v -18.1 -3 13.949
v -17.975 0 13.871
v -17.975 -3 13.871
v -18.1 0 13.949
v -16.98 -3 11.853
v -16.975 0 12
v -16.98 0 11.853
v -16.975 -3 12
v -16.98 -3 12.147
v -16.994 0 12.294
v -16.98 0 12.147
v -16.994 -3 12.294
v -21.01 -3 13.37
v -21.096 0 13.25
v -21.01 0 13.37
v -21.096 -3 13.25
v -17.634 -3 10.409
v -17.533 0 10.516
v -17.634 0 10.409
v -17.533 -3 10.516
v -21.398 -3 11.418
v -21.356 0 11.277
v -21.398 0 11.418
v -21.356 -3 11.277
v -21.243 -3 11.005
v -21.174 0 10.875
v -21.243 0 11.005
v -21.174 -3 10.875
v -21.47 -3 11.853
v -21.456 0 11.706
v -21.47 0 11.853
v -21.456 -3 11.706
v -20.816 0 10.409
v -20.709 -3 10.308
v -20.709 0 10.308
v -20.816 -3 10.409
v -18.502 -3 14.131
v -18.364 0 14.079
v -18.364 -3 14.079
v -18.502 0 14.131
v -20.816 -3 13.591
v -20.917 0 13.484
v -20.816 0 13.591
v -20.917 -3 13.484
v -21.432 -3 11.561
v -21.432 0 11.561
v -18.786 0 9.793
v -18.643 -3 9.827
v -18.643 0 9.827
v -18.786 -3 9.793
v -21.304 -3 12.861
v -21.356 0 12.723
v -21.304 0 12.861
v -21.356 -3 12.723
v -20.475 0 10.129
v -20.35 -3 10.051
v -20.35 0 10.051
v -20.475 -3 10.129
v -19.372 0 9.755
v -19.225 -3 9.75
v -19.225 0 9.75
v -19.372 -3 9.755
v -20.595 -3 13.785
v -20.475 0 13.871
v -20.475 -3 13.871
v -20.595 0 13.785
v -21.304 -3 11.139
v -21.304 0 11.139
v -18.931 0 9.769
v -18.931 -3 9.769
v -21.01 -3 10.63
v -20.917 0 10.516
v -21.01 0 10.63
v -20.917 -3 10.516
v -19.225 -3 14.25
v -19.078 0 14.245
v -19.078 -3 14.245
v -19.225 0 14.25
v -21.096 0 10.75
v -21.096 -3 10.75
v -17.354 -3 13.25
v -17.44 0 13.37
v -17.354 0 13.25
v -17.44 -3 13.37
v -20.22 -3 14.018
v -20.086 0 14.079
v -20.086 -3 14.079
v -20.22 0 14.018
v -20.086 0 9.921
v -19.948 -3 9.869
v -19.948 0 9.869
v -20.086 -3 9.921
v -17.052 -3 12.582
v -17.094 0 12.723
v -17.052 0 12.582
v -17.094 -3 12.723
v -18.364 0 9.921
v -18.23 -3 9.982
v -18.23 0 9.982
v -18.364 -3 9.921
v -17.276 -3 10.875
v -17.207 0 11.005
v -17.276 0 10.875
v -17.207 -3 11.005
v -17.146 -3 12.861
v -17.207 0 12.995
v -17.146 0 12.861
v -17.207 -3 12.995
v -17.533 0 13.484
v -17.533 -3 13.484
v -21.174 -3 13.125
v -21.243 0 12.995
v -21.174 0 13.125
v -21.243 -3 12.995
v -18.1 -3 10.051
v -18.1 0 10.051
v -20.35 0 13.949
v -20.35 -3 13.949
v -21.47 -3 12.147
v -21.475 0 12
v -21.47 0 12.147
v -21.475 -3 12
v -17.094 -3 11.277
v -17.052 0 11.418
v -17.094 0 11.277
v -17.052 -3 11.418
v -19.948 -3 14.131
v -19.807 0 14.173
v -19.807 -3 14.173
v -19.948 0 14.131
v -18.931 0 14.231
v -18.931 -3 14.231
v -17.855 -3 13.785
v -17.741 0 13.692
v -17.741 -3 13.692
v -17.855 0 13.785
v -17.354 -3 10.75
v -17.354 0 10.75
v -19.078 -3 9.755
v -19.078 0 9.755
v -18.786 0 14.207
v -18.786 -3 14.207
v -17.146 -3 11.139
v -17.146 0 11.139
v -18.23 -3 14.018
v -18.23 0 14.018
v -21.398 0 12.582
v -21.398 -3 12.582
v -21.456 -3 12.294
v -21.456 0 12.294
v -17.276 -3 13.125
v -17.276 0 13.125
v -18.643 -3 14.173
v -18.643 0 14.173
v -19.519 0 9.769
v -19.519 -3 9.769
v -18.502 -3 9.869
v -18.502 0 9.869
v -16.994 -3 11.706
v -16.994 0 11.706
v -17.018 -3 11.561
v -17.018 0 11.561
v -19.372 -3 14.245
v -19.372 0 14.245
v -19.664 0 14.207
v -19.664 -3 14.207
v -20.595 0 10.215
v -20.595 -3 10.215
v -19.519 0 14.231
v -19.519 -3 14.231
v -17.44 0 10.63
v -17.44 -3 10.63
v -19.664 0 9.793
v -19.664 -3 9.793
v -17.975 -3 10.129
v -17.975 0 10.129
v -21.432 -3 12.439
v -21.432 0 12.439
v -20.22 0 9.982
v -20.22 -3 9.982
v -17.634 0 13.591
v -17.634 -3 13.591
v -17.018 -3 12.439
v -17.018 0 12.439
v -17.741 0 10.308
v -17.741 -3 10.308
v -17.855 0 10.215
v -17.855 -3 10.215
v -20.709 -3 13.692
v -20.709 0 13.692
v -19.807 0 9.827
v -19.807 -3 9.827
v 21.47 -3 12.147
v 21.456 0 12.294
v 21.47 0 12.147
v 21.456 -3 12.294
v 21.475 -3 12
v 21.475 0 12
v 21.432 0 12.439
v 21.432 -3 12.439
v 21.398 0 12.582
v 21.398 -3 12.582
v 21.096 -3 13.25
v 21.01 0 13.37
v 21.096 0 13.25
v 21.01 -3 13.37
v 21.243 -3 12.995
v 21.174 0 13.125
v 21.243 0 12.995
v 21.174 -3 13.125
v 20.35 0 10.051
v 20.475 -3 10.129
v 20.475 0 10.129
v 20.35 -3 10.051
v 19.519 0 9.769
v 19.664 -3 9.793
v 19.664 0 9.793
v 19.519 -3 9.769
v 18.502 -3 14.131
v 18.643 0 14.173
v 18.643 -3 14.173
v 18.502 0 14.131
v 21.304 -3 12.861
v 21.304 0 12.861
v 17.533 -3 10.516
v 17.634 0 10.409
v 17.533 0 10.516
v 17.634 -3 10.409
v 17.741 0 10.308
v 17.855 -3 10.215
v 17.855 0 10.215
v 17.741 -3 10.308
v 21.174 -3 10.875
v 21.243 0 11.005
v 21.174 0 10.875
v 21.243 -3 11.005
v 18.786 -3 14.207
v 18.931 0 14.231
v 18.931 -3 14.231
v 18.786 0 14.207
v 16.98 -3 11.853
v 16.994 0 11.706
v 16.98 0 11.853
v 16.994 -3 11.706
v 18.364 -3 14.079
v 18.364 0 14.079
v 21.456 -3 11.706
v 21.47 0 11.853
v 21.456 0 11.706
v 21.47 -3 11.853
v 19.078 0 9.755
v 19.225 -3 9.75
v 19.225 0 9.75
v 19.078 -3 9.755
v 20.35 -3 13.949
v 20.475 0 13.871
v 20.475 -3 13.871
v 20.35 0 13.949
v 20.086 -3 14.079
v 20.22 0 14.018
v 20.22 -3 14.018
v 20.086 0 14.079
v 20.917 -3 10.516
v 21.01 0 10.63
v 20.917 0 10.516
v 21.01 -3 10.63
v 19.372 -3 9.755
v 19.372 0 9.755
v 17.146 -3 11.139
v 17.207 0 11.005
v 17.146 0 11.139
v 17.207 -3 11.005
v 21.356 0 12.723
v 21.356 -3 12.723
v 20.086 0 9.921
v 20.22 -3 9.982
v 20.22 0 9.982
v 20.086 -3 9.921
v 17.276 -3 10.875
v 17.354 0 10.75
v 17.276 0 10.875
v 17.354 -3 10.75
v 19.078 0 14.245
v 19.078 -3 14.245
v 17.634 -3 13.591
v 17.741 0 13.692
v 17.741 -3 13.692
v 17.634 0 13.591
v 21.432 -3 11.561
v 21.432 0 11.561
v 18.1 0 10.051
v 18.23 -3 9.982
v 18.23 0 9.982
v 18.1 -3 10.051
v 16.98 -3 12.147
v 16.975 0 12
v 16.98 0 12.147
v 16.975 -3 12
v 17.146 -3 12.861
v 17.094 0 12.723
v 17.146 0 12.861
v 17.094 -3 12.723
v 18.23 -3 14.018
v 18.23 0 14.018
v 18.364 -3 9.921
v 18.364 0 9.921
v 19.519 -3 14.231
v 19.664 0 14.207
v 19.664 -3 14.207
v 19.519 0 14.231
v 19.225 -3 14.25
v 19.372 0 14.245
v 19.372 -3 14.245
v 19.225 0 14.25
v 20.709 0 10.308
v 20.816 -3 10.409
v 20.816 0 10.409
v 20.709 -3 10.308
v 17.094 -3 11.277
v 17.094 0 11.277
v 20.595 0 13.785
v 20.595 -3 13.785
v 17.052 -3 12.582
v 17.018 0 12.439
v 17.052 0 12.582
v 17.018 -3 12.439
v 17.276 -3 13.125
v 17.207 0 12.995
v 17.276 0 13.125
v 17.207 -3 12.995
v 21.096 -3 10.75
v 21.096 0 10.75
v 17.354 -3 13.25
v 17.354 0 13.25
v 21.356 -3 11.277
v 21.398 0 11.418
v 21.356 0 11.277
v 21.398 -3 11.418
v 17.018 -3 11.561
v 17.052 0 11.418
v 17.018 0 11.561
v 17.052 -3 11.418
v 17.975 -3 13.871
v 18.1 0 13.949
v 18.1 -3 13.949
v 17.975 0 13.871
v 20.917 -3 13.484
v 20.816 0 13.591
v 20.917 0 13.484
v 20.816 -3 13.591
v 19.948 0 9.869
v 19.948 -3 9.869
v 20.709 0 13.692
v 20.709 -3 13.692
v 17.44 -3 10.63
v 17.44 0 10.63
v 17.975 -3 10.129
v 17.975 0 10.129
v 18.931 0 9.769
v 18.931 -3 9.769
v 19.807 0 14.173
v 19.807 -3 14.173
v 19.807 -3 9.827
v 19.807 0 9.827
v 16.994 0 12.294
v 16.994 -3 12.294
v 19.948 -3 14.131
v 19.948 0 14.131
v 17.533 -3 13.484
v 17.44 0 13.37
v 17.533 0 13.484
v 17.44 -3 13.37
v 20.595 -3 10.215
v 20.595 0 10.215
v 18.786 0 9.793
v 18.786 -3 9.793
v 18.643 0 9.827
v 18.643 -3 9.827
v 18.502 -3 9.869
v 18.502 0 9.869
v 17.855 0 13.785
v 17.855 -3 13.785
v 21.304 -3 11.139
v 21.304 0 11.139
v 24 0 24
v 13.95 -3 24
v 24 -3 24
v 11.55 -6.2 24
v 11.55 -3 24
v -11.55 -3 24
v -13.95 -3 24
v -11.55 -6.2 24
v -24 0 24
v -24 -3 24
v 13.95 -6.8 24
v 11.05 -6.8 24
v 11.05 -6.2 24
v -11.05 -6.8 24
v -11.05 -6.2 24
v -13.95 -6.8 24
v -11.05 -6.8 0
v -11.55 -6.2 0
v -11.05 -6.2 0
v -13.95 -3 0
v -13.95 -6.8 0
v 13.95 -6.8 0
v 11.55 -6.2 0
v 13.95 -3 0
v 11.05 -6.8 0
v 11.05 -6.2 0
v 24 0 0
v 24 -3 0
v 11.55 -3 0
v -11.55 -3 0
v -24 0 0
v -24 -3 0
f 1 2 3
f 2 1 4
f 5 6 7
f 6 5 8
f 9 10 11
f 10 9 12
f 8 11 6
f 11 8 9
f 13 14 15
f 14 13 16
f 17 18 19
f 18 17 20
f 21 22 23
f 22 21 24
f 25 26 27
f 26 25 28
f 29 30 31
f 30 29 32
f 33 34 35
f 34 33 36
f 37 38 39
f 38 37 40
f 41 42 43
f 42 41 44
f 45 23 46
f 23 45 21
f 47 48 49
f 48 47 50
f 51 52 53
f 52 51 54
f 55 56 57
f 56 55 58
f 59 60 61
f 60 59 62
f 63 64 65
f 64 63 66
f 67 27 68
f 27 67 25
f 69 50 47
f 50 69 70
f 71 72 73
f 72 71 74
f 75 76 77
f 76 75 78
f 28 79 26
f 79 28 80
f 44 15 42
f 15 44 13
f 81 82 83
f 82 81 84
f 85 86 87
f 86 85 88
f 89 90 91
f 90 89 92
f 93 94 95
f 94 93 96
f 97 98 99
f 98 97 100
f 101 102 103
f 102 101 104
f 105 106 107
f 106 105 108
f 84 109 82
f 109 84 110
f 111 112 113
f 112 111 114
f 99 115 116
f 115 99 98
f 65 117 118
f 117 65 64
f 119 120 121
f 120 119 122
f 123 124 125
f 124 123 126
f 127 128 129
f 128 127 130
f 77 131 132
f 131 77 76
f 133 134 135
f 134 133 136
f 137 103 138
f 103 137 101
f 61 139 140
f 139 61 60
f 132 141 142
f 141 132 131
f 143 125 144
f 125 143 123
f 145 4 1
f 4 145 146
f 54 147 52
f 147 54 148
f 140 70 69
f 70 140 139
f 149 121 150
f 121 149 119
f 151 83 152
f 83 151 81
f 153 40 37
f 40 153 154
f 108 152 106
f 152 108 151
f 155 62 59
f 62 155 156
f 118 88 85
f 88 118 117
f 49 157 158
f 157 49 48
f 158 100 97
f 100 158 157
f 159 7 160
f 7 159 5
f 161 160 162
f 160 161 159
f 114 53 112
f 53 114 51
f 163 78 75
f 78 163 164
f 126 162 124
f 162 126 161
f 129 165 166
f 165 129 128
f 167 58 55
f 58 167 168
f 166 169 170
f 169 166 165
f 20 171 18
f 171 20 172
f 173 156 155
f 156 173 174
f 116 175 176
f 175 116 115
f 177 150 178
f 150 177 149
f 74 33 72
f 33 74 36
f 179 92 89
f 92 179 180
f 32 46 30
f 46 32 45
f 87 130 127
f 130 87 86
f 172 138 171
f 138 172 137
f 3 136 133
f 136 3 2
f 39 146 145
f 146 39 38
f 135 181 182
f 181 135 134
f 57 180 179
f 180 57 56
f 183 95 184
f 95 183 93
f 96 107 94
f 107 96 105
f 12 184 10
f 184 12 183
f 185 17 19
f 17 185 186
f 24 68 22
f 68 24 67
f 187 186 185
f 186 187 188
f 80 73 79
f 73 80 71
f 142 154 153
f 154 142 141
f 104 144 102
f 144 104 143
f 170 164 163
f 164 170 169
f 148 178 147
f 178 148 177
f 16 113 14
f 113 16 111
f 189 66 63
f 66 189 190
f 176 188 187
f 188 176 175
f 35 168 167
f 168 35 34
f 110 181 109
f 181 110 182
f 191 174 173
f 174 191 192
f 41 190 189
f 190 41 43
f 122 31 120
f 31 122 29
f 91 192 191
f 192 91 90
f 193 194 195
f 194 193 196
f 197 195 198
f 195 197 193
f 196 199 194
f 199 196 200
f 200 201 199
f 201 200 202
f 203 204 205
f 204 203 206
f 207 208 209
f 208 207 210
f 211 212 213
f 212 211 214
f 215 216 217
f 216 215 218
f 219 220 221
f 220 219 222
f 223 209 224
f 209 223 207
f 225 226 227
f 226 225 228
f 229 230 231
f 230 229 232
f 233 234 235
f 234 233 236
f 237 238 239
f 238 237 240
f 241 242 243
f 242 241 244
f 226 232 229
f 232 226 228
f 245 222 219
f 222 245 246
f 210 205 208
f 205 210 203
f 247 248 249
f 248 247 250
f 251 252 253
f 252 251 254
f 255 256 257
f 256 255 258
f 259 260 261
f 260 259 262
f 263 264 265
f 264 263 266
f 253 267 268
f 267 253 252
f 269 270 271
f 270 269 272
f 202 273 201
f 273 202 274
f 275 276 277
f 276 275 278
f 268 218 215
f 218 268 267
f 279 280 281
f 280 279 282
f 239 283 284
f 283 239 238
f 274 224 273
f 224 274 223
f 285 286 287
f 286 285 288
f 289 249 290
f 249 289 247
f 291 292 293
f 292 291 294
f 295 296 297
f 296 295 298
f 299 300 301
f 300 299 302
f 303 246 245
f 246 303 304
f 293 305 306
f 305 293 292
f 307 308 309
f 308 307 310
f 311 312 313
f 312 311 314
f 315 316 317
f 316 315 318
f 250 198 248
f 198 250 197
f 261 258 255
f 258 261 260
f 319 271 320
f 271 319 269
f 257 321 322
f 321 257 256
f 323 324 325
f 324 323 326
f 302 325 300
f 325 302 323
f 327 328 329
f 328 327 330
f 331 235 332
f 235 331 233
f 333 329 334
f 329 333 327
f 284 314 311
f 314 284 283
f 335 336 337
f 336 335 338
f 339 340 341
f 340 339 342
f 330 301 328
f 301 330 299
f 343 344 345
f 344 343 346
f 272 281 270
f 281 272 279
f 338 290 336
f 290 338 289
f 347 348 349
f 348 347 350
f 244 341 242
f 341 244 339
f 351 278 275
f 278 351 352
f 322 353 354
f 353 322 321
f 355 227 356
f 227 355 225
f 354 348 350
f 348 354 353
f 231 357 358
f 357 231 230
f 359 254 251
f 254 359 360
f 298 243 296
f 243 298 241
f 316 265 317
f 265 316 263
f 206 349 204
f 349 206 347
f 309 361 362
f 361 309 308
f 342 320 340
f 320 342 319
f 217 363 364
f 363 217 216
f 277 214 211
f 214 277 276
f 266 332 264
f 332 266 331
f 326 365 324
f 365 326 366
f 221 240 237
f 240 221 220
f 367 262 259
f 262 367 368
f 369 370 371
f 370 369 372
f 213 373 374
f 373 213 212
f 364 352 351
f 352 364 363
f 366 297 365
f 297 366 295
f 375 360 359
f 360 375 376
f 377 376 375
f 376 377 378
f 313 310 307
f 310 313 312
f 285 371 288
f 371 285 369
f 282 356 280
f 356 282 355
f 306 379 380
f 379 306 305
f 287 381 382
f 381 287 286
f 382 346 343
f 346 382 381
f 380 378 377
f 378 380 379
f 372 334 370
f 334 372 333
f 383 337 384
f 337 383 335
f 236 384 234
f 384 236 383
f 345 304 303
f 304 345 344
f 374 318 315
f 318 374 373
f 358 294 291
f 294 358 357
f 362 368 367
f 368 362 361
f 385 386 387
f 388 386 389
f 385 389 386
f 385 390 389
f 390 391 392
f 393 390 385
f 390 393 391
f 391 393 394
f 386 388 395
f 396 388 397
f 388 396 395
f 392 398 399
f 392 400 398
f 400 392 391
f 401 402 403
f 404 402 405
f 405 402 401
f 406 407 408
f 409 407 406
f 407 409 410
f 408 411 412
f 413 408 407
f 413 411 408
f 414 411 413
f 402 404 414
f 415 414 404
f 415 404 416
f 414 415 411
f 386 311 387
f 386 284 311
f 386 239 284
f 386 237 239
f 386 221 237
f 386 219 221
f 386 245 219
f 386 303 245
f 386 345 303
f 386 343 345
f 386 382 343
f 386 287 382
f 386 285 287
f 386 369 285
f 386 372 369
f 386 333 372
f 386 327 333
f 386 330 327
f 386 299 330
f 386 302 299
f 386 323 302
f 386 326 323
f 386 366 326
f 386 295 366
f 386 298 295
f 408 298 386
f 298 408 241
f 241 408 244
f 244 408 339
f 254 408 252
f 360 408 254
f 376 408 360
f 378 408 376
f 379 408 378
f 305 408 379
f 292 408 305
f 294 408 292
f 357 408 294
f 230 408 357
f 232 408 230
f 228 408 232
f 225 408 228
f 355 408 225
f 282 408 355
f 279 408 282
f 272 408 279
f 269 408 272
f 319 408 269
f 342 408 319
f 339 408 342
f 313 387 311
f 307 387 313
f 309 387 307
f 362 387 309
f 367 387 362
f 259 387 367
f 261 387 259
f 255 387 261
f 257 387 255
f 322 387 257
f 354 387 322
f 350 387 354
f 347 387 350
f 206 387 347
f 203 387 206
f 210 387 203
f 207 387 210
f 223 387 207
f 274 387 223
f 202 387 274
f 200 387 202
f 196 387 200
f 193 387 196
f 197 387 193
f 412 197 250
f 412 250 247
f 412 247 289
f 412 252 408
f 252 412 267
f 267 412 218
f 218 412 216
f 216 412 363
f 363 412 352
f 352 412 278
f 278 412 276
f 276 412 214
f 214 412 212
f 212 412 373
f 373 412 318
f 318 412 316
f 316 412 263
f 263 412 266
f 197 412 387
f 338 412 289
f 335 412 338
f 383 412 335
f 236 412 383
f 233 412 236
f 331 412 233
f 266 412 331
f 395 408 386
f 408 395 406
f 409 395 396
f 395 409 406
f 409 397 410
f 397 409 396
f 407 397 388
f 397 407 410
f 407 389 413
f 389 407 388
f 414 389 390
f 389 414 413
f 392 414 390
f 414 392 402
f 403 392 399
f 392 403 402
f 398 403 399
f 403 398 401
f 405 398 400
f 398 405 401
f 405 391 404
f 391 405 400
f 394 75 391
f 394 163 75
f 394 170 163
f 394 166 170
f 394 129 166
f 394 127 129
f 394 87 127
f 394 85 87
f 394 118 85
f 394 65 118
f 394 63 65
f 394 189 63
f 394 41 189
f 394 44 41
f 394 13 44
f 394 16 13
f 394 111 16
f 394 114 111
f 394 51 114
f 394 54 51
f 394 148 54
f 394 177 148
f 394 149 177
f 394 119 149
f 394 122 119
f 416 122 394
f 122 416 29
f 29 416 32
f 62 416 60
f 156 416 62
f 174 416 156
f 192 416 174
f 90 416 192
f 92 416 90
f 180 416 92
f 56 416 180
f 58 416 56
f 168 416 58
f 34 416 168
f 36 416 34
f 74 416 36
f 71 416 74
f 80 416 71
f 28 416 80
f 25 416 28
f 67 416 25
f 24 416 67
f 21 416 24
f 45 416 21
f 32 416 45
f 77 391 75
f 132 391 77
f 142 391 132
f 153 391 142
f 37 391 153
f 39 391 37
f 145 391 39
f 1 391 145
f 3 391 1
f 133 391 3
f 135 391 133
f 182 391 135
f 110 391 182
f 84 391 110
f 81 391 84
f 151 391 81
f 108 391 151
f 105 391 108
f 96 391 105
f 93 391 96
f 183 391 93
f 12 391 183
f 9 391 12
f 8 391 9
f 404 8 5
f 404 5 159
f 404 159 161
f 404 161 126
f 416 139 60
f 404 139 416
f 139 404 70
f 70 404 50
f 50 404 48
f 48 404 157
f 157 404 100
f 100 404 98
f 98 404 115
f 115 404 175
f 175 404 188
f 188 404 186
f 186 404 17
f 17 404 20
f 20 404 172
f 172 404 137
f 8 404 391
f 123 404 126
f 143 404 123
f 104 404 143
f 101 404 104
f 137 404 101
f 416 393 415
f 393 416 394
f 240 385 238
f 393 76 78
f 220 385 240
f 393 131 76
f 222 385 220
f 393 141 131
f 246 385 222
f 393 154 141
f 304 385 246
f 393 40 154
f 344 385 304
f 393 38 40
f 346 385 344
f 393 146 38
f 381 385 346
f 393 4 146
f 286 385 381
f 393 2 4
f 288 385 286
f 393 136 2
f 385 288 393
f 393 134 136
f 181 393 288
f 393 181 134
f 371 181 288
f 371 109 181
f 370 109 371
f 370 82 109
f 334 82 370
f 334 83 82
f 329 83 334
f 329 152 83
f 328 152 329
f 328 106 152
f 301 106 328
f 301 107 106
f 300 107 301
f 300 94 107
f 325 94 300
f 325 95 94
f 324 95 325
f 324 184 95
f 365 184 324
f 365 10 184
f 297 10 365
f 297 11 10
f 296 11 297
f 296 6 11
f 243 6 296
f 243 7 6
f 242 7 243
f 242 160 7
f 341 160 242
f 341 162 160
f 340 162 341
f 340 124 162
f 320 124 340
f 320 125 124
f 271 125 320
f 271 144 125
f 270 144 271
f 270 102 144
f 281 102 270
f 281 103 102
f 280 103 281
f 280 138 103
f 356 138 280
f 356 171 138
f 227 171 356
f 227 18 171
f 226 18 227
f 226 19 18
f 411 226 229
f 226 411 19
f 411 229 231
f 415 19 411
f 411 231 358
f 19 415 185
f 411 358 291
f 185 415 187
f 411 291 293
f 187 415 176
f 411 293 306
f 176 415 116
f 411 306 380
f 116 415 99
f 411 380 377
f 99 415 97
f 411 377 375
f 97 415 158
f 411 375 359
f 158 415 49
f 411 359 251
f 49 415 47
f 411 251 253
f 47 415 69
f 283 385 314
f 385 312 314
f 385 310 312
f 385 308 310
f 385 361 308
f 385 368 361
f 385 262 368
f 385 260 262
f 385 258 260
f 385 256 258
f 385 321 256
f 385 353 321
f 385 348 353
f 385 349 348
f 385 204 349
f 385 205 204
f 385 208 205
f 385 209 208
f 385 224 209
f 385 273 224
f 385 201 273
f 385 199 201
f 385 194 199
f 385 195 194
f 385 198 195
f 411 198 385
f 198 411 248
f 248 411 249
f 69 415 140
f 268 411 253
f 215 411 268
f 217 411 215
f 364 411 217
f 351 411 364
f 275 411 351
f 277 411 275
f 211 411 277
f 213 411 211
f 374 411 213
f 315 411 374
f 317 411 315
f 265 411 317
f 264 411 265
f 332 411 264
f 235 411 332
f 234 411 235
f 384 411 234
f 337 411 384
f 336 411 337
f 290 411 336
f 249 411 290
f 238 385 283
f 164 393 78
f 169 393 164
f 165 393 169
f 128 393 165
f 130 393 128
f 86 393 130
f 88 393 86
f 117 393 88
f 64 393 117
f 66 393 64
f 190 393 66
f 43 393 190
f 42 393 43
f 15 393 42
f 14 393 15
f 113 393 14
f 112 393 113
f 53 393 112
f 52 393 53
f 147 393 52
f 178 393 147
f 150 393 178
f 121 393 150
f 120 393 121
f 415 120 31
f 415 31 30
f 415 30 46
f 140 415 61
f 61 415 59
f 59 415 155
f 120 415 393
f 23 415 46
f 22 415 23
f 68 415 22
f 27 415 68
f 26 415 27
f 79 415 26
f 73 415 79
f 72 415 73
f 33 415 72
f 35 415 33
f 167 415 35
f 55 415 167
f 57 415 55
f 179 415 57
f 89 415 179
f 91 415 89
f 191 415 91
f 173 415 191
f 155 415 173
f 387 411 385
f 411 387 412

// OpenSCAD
// V-102 shelf mount, revision 02. All dimensions in mm.
// User-reported fit on one lamp; no load or temperature rating.
/* [Fit] */
lamp_width = 23.5;
inner_spacing = 23.1;
tongue_entry = 0.7;
tongue_thickness = 0.6;
tongue_lower_height = 6.2;
/* [Structure] */
wall_thickness = 2.4;
base_thickness = 3;
base_width = 48;
clip_length = 24;
/* [Screws] */
hole_diameter = 4.5;
hole_centers = 38.45;
/* [Export] */
print_orientation = true;
/* [Hidden] */
$fn = 96;
i = inner_spacing/2;
o = i + wall_thickness;
t = lamp_width/2 - tongue_entry;
z0 = tongue_lower_height;
z1 = z0 + tongue_thickness;
assert(t > 0 && i > t, "Tongue projection must be positive.");
assert(z0 > base_thickness && tongue_thickness > 0 && clip_length > 0);
assert(hole_centers/2 - hole_diameter/2 > o, "Hole overlaps side wall.");
assert(hole_centers/2 + hole_diameter/2 < base_width/2, "Hole crosses plate edge.");
module mount() {
    difference() {
        translate([0,clip_length,0]) rotate([90,0,0])
        linear_extrude(clip_length)
        polygon([[-base_width/2,0],[base_width/2,0],
            [base_width/2,base_thickness],[o,base_thickness],
            [o,z1],[t,z1],[t,z0],[i,z0],[i,base_thickness],
            [-i,base_thickness],[-i,z0],[-t,z0],[-t,z1],
            [-o,z1],[-o,base_thickness],[-base_width/2,base_thickness]]);
        for (x=[-hole_centers/2,hole_centers/2])
            translate([x,clip_length/2,-1])
                cylinder(d=hole_diameter,h=base_thickness+2);
    }
}
if(print_orientation) rotate([90,0,0]) mount(); else mount();
